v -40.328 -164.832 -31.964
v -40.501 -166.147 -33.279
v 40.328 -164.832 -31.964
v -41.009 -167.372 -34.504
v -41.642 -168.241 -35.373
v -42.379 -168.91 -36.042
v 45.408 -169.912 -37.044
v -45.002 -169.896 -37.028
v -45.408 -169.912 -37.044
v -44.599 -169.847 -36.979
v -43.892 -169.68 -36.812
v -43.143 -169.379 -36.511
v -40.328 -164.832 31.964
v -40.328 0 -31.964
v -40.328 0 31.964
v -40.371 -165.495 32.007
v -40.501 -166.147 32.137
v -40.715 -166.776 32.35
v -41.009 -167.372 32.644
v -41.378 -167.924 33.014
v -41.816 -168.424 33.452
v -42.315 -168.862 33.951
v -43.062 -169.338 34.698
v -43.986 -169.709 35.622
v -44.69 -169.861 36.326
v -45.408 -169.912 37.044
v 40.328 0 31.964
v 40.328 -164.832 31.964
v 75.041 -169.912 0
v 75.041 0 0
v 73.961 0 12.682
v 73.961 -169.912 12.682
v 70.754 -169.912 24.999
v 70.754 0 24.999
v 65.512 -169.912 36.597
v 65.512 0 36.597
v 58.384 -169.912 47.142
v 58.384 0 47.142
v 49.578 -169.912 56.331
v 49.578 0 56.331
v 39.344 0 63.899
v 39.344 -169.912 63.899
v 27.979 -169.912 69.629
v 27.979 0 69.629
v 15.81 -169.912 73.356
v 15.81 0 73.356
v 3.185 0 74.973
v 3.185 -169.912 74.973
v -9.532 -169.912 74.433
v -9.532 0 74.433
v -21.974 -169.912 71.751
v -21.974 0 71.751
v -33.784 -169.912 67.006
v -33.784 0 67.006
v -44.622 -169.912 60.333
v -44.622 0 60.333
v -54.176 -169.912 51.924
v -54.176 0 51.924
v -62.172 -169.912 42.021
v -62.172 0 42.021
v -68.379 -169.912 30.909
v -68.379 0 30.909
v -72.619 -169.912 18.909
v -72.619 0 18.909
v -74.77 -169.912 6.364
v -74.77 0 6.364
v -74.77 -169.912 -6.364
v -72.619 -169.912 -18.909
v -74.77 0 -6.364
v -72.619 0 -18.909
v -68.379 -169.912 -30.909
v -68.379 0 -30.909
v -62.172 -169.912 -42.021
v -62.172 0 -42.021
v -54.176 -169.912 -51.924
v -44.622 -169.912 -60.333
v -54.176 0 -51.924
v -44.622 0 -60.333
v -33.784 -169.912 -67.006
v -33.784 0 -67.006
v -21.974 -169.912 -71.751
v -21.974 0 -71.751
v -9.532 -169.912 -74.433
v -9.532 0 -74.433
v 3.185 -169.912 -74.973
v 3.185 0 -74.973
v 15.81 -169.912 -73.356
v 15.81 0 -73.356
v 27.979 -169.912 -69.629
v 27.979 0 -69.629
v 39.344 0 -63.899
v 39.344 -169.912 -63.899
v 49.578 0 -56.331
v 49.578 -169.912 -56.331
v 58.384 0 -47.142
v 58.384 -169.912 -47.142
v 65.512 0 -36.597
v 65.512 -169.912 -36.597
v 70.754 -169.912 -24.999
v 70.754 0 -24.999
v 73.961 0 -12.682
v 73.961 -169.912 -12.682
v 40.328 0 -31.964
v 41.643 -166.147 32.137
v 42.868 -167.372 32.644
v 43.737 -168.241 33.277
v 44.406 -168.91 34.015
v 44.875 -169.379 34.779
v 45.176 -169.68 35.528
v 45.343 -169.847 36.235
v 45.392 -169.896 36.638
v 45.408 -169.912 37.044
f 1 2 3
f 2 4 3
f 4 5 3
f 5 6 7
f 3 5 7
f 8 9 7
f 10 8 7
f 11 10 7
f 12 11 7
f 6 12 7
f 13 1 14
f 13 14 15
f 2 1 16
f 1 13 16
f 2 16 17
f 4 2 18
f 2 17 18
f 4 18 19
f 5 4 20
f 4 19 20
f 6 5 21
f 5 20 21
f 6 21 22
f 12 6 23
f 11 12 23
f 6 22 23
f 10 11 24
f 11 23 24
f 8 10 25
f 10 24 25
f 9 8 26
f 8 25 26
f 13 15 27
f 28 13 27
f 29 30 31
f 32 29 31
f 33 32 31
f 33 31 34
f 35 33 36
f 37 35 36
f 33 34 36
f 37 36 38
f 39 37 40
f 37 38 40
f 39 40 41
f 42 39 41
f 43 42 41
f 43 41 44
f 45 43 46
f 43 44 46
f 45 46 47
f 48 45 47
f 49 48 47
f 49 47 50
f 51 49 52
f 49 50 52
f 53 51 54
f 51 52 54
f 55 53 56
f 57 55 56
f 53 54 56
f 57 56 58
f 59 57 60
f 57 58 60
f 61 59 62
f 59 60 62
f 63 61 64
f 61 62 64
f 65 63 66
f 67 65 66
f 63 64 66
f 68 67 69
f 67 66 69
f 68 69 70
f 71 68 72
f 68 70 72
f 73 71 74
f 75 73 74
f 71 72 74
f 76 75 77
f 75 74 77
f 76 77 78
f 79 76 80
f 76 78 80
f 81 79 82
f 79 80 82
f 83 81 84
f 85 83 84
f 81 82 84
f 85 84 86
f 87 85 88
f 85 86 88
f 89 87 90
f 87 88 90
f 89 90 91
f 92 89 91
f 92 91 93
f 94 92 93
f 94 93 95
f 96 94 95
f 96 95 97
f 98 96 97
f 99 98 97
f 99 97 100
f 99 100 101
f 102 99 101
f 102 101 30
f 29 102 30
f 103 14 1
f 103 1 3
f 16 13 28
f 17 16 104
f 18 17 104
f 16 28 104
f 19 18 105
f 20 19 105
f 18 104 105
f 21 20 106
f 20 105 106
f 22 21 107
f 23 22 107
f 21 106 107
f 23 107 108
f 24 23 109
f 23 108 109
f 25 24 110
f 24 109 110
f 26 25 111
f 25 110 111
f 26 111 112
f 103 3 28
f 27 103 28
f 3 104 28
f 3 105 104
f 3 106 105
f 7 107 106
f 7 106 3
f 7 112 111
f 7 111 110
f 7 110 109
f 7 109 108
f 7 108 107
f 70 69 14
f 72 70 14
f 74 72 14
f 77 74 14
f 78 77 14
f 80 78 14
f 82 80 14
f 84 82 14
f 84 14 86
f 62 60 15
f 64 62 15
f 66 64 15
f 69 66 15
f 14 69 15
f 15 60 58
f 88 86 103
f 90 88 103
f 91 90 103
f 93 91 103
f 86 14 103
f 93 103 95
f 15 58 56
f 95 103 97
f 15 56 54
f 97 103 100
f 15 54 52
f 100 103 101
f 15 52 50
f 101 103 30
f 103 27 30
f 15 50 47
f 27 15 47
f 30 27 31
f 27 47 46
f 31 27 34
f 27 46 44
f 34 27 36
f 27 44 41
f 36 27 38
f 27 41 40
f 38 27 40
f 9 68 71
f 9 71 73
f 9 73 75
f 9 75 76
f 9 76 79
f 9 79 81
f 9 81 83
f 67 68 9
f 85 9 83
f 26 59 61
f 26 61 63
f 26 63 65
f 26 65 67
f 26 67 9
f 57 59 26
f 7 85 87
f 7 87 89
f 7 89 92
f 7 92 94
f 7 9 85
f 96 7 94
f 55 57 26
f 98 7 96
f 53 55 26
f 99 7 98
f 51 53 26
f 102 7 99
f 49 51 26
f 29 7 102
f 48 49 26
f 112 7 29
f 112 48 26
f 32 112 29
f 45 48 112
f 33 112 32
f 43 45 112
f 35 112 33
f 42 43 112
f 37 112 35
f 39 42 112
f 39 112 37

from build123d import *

# Parameters (mm, degrees)
F0_R     = 75.040734
F0_W     = 80.655844
F0_H     = 63.927502
F1_DEPTH = 169.911919
F2_R     = 5.08
F3_SIZE  = 5.08


with BuildPart() as f1:
    # F0 (on Front) → F1 (new body)
    with BuildSketch(Plane.XZ):
        Circle(F0_R)
        Rectangle(F0_W, F0_H, mode=Mode.SUBTRACT)
    extrude(amount=F1_DEPTH)

    # F2
    f2_edges = [f1.edges().sort_by_distance(p)[0] for p in [
        (0, -169.911919, 31.963751),
        (-40.327922, -169.911919, 0),
    ]]
    fillet(f2_edges, radius=F2_R)

    # F3
    f3_edges = [f1.edges().sort_by_distance(p)[0] for p in [
        (40.327922, -169.911919, 0),
        (0, -169.911919, -31.963751),
    ]]
    chamfer(f3_edges, length=F3_SIZE)


solid = f1.part
